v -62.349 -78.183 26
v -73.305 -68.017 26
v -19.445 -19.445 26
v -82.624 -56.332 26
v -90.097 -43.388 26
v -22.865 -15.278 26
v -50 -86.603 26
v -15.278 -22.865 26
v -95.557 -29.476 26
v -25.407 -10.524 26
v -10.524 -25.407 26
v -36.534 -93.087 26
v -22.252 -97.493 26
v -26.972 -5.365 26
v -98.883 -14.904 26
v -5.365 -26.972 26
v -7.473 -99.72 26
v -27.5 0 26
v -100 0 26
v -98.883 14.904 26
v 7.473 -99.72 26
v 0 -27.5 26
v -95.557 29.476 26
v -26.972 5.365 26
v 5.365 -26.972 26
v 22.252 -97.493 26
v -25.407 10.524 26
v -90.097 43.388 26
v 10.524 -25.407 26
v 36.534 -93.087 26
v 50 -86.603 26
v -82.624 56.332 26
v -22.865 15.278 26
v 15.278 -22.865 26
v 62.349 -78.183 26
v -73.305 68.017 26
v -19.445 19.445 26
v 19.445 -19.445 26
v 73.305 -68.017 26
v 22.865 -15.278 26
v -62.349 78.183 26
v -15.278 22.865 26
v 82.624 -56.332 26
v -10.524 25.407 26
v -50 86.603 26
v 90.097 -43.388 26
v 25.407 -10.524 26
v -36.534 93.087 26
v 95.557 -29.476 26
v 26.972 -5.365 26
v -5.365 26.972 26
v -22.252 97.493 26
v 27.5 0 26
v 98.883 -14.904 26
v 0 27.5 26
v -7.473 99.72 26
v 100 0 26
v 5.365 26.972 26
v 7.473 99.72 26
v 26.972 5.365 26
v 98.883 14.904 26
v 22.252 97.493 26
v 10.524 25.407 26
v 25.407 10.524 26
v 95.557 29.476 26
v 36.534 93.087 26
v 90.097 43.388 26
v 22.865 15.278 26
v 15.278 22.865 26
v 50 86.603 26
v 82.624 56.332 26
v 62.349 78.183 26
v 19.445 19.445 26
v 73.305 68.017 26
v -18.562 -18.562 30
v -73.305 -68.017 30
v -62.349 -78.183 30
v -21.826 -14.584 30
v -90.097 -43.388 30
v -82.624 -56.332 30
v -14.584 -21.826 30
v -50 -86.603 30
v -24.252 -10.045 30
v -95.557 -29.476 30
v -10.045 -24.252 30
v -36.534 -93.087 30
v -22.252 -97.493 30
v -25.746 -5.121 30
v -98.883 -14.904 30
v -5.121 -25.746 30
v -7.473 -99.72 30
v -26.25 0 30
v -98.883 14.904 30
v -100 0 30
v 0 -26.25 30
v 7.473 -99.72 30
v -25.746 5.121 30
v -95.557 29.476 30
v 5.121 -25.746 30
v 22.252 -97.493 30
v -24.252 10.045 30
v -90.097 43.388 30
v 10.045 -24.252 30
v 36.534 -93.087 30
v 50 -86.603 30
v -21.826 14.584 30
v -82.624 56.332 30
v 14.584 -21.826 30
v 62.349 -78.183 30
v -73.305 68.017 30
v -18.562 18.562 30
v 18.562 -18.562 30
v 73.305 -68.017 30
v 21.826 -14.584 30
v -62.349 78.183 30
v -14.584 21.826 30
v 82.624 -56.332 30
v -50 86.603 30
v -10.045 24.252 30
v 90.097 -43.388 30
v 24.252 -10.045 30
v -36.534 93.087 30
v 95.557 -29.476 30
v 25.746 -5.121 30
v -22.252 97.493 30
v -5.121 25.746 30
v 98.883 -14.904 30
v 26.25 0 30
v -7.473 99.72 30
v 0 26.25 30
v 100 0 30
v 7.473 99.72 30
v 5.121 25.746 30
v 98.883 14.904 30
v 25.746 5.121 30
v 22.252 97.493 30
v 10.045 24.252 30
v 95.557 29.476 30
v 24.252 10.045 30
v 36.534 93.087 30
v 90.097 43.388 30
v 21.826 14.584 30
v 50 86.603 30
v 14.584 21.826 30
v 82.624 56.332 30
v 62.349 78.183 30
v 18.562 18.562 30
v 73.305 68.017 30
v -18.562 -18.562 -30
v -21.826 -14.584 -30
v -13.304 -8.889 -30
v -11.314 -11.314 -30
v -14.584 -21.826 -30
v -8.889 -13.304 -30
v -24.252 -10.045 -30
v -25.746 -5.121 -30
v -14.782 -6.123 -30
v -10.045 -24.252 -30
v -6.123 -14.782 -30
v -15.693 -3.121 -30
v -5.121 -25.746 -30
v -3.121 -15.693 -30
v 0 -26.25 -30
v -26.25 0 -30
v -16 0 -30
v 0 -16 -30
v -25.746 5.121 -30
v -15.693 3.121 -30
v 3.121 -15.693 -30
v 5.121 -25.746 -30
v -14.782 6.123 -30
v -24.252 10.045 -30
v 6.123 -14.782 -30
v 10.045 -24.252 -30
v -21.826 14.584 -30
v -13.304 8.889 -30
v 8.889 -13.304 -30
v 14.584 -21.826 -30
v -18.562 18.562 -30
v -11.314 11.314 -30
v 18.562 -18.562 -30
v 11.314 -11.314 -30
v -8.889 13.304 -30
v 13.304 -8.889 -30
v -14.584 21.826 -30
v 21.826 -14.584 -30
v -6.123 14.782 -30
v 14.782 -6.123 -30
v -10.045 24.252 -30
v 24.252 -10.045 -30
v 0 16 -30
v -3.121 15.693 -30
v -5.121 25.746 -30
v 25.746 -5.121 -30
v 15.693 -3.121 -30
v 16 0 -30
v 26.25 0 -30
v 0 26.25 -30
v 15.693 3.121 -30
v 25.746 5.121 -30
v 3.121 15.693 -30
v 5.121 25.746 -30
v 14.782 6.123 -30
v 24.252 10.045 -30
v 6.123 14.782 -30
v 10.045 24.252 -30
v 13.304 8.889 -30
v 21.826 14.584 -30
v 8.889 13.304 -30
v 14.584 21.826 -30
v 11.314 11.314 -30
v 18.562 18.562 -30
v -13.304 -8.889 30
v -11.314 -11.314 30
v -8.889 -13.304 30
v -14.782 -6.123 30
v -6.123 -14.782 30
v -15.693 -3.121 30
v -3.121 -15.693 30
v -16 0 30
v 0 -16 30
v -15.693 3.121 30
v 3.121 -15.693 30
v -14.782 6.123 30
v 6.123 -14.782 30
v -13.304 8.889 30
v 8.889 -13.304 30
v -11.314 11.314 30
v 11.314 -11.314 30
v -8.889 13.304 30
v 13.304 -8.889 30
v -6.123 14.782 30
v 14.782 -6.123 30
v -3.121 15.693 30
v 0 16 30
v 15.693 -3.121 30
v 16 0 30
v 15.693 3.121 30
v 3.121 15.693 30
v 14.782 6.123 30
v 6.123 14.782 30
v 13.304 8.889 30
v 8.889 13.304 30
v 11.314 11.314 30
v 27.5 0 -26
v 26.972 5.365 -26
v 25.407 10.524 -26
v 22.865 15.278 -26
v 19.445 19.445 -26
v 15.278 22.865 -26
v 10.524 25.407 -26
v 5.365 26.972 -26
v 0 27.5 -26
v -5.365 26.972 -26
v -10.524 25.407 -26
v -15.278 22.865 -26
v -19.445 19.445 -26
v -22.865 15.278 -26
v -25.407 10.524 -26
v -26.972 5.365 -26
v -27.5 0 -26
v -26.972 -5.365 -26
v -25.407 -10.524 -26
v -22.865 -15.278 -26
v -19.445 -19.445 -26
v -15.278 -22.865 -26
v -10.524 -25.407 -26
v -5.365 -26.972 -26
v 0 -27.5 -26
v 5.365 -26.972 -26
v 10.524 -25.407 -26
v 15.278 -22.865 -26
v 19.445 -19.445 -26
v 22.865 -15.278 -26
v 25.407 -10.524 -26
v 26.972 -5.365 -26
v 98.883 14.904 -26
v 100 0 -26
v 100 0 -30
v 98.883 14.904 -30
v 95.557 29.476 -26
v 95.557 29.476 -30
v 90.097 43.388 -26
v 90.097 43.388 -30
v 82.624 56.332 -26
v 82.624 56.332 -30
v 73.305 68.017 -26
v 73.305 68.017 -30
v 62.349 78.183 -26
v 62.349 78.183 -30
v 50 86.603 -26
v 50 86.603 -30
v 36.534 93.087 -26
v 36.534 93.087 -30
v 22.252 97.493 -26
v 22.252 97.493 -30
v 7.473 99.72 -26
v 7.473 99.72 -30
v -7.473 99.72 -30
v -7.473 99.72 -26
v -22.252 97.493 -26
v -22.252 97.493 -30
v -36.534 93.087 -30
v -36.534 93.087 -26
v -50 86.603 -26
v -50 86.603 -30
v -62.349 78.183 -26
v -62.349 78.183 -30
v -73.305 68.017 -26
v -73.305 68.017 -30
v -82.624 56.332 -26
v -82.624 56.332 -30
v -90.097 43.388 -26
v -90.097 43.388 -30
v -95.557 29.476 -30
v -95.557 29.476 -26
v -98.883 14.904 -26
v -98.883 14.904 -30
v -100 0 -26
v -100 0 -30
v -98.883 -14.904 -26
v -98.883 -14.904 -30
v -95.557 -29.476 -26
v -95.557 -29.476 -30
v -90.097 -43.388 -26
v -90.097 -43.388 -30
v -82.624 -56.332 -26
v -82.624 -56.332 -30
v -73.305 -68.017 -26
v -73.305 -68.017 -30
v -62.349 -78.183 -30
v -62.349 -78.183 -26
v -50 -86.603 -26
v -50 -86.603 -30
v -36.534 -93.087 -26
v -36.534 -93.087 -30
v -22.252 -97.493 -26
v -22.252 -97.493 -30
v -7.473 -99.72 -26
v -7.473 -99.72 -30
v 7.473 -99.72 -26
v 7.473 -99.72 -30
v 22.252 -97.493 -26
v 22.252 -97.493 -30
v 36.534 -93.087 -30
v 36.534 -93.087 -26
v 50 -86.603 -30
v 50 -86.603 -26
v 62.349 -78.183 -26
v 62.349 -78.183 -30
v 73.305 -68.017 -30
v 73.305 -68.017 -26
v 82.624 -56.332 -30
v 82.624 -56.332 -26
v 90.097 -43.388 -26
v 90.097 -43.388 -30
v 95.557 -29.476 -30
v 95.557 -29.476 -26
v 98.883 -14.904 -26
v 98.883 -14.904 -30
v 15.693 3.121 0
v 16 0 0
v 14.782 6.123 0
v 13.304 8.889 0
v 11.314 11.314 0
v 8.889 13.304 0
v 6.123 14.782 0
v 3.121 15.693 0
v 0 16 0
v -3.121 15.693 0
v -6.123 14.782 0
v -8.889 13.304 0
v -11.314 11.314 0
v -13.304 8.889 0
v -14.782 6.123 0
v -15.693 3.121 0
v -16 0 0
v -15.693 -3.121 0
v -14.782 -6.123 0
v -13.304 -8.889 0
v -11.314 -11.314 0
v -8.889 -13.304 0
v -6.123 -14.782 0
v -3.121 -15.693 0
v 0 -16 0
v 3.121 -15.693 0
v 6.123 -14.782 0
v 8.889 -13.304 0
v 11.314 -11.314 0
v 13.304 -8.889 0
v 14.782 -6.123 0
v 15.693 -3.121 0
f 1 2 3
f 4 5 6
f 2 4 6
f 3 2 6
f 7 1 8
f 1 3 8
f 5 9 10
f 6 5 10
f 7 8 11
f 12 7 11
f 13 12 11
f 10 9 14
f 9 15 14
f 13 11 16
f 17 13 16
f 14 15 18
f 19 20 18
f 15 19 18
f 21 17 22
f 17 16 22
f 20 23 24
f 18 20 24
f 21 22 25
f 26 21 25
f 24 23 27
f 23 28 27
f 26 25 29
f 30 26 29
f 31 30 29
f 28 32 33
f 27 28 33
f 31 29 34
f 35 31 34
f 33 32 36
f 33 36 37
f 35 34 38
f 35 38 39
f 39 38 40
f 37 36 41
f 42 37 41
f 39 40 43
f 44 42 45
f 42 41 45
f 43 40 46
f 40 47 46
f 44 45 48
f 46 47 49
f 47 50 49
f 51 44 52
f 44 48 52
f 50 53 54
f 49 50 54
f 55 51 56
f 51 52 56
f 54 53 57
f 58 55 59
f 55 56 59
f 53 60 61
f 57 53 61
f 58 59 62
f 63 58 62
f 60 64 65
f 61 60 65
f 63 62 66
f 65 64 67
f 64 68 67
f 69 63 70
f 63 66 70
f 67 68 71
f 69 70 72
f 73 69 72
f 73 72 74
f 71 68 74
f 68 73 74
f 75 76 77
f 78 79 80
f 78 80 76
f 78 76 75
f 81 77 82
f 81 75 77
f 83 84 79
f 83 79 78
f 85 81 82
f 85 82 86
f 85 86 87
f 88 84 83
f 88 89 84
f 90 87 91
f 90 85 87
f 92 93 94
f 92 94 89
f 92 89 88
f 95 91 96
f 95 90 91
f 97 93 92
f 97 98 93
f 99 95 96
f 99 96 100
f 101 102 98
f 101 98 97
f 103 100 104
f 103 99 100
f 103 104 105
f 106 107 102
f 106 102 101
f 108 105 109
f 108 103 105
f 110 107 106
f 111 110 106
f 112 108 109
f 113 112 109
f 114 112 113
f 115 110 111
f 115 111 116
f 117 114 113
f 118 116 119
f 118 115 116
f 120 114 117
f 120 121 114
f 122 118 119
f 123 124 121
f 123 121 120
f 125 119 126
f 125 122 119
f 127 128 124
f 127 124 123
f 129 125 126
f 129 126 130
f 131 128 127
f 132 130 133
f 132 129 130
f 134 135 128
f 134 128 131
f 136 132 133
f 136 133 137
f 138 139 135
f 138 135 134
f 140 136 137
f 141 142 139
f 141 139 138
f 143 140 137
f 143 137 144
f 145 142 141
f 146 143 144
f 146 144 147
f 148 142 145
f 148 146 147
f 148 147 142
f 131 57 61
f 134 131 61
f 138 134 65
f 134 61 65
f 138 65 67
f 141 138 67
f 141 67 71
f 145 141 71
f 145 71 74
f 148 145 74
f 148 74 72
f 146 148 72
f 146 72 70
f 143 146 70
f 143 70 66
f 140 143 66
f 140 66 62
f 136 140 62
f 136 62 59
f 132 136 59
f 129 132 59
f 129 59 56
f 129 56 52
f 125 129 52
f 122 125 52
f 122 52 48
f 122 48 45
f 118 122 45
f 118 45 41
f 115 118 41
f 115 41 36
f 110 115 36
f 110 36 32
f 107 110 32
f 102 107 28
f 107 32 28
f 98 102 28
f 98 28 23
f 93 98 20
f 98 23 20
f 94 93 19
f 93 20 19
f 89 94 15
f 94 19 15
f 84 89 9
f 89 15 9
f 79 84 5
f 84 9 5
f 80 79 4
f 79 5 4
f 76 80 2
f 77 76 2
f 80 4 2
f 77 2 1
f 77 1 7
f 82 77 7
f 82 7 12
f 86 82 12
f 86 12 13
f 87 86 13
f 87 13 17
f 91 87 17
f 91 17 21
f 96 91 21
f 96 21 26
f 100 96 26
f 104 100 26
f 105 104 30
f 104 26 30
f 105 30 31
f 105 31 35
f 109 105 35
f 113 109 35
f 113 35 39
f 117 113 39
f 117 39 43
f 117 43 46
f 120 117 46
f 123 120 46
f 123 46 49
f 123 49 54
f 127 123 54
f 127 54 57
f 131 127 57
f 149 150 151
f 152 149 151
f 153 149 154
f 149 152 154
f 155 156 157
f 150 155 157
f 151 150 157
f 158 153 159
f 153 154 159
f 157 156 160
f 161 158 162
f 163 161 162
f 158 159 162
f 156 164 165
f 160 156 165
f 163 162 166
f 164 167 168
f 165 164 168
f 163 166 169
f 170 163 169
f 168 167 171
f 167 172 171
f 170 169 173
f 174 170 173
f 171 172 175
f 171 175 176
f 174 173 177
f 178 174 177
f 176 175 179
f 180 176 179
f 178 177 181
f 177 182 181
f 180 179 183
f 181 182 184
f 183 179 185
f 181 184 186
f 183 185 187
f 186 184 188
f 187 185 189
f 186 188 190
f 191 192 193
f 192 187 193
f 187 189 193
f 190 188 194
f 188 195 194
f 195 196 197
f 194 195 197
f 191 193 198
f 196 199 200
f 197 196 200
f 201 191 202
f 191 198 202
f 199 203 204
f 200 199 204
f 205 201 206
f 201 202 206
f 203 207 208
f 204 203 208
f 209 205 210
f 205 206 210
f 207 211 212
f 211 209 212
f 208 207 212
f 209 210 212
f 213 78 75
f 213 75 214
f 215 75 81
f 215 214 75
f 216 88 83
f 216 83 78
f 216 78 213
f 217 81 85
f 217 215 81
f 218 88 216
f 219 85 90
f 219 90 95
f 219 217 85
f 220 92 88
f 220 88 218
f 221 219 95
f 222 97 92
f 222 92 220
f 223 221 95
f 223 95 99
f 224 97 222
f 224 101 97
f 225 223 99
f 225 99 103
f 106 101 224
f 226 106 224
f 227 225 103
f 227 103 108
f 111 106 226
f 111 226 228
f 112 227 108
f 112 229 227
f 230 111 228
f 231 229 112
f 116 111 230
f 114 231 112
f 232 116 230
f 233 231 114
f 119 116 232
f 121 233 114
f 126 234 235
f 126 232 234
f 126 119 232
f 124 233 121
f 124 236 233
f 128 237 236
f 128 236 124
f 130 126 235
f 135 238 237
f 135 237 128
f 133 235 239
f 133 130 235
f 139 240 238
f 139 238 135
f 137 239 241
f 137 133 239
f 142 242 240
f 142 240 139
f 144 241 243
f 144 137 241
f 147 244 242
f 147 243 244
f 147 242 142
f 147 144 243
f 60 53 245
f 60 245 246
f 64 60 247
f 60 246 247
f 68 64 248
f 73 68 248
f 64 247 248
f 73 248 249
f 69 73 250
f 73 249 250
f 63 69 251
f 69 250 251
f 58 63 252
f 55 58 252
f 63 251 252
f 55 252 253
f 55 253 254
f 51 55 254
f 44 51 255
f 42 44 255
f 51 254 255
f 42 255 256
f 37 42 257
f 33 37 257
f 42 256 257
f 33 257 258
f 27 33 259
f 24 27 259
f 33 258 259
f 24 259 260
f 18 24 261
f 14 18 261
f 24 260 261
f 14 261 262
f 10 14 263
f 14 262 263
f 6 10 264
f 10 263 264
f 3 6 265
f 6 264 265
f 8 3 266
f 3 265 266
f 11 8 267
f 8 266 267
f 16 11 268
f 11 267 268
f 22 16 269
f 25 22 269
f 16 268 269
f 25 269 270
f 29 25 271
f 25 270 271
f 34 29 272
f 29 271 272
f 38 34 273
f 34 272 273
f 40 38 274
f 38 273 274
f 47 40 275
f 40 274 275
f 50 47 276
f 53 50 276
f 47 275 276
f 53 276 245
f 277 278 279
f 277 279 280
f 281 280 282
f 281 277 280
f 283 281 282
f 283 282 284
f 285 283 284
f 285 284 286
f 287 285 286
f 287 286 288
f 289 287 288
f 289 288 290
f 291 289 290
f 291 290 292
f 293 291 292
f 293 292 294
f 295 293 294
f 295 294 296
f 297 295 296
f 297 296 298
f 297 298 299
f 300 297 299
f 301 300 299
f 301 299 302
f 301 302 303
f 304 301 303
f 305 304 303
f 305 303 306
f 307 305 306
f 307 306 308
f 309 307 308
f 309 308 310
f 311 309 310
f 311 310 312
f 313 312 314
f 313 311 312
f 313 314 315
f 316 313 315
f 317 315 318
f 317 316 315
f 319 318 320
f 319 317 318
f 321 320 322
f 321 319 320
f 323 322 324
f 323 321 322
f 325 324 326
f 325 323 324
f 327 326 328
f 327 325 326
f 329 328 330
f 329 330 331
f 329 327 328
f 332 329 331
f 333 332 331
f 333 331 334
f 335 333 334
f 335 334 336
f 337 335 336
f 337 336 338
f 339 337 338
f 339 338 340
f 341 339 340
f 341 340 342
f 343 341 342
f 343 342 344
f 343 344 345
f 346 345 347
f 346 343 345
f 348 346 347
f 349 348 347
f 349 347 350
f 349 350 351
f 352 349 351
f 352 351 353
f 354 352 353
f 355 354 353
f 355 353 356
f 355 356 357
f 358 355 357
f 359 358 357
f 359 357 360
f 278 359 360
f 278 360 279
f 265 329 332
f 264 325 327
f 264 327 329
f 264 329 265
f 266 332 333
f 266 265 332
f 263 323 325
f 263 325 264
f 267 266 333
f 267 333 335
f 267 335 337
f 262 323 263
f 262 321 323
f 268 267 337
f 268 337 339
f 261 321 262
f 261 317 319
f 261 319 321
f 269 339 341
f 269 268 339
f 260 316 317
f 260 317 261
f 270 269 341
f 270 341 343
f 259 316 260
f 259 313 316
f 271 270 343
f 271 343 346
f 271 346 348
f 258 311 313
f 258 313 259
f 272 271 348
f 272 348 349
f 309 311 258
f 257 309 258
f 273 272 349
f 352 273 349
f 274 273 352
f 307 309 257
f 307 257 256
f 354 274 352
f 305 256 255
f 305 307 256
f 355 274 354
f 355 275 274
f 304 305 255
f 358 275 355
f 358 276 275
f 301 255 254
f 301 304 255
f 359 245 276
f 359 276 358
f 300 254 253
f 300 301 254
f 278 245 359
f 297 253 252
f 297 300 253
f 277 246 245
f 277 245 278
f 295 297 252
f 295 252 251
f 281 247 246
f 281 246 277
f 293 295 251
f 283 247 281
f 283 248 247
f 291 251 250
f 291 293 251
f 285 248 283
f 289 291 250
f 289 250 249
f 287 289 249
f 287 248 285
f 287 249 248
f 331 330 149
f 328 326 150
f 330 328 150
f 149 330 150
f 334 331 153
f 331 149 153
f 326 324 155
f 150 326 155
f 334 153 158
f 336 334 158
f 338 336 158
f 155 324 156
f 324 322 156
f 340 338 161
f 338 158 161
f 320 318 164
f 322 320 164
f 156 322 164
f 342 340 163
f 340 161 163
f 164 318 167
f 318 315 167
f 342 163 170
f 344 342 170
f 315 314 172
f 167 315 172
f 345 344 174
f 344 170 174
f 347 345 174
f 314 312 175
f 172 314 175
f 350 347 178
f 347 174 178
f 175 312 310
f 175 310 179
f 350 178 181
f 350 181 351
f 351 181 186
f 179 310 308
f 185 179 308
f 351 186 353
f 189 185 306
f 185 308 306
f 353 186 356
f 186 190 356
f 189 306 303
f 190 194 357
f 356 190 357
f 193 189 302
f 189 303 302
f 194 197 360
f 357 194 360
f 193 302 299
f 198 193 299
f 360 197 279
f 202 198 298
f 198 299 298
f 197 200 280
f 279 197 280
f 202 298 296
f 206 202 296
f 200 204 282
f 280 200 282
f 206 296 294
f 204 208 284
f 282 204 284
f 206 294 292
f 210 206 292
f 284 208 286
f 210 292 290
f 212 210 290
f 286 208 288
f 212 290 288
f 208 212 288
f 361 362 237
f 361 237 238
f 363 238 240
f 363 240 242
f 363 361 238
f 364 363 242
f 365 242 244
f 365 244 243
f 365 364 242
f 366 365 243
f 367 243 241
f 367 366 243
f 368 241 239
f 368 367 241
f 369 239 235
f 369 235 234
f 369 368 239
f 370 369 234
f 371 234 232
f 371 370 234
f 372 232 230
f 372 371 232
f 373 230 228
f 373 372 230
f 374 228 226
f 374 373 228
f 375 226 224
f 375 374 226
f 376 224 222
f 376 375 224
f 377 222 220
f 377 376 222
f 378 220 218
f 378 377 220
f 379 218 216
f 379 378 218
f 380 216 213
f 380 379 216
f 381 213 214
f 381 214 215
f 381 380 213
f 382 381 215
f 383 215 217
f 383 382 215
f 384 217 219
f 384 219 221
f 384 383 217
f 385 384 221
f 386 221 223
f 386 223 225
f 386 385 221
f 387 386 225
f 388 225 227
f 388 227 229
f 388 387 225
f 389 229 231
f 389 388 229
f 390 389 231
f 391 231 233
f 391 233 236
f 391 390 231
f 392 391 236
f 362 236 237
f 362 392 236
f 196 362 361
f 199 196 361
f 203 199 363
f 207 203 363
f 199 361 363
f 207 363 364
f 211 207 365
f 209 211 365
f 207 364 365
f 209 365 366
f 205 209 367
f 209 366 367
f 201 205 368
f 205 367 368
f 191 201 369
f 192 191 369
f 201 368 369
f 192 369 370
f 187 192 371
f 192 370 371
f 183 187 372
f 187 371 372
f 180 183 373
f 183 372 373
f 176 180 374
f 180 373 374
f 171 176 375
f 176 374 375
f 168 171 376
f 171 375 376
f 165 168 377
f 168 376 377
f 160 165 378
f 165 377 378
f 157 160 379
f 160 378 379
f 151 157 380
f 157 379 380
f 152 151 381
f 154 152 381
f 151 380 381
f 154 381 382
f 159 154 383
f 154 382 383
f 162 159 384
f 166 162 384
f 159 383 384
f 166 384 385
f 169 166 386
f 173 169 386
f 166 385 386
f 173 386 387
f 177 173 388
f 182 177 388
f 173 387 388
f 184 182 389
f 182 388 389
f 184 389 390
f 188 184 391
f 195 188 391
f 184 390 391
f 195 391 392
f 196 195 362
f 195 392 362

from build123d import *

# Parameters (mm, degrees)
SKETCH1_R           = 100
SKETCH1_R_2         = 26.25
SKETCH1_R_3         = 16.000000004
BOSS_EXTRUDE1_DEPTH = 30
SKETCH2_R           = 100
SKETCH2_R_2         = 27.5
CUT_EXTRUDE1_DEPTH  = 26


with BuildPart() as part:
    # Sketch1 → Boss-Extrude1 (new, symmetric)
    # profile 1 of 2: a face of its own
    with BuildSketch(Plane.XY):
        Circle(SKETCH1_R)
        Circle(SKETCH1_R_2, mode=Mode.SUBTRACT)
    # profile 2 of 2: a face of its own
    with BuildSketch(Plane.XY):
        Circle(SKETCH1_R_2)
        Circle(SKETCH1_R_3, mode=Mode.SUBTRACT)
    extrude(amount=BOSS_EXTRUDE1_DEPTH, both=True)

    # Sketch2 → Cut-Extrude1 (cut, symmetric)
    with BuildSketch(Plane.XY):
        Circle(SKETCH2_R)
        Circle(SKETCH2_R_2, mode=Mode.SUBTRACT)
    extrude(amount=CUT_EXTRUDE1_DEPTH, both=True, mode=Mode.SUBTRACT)


solid = part.part
